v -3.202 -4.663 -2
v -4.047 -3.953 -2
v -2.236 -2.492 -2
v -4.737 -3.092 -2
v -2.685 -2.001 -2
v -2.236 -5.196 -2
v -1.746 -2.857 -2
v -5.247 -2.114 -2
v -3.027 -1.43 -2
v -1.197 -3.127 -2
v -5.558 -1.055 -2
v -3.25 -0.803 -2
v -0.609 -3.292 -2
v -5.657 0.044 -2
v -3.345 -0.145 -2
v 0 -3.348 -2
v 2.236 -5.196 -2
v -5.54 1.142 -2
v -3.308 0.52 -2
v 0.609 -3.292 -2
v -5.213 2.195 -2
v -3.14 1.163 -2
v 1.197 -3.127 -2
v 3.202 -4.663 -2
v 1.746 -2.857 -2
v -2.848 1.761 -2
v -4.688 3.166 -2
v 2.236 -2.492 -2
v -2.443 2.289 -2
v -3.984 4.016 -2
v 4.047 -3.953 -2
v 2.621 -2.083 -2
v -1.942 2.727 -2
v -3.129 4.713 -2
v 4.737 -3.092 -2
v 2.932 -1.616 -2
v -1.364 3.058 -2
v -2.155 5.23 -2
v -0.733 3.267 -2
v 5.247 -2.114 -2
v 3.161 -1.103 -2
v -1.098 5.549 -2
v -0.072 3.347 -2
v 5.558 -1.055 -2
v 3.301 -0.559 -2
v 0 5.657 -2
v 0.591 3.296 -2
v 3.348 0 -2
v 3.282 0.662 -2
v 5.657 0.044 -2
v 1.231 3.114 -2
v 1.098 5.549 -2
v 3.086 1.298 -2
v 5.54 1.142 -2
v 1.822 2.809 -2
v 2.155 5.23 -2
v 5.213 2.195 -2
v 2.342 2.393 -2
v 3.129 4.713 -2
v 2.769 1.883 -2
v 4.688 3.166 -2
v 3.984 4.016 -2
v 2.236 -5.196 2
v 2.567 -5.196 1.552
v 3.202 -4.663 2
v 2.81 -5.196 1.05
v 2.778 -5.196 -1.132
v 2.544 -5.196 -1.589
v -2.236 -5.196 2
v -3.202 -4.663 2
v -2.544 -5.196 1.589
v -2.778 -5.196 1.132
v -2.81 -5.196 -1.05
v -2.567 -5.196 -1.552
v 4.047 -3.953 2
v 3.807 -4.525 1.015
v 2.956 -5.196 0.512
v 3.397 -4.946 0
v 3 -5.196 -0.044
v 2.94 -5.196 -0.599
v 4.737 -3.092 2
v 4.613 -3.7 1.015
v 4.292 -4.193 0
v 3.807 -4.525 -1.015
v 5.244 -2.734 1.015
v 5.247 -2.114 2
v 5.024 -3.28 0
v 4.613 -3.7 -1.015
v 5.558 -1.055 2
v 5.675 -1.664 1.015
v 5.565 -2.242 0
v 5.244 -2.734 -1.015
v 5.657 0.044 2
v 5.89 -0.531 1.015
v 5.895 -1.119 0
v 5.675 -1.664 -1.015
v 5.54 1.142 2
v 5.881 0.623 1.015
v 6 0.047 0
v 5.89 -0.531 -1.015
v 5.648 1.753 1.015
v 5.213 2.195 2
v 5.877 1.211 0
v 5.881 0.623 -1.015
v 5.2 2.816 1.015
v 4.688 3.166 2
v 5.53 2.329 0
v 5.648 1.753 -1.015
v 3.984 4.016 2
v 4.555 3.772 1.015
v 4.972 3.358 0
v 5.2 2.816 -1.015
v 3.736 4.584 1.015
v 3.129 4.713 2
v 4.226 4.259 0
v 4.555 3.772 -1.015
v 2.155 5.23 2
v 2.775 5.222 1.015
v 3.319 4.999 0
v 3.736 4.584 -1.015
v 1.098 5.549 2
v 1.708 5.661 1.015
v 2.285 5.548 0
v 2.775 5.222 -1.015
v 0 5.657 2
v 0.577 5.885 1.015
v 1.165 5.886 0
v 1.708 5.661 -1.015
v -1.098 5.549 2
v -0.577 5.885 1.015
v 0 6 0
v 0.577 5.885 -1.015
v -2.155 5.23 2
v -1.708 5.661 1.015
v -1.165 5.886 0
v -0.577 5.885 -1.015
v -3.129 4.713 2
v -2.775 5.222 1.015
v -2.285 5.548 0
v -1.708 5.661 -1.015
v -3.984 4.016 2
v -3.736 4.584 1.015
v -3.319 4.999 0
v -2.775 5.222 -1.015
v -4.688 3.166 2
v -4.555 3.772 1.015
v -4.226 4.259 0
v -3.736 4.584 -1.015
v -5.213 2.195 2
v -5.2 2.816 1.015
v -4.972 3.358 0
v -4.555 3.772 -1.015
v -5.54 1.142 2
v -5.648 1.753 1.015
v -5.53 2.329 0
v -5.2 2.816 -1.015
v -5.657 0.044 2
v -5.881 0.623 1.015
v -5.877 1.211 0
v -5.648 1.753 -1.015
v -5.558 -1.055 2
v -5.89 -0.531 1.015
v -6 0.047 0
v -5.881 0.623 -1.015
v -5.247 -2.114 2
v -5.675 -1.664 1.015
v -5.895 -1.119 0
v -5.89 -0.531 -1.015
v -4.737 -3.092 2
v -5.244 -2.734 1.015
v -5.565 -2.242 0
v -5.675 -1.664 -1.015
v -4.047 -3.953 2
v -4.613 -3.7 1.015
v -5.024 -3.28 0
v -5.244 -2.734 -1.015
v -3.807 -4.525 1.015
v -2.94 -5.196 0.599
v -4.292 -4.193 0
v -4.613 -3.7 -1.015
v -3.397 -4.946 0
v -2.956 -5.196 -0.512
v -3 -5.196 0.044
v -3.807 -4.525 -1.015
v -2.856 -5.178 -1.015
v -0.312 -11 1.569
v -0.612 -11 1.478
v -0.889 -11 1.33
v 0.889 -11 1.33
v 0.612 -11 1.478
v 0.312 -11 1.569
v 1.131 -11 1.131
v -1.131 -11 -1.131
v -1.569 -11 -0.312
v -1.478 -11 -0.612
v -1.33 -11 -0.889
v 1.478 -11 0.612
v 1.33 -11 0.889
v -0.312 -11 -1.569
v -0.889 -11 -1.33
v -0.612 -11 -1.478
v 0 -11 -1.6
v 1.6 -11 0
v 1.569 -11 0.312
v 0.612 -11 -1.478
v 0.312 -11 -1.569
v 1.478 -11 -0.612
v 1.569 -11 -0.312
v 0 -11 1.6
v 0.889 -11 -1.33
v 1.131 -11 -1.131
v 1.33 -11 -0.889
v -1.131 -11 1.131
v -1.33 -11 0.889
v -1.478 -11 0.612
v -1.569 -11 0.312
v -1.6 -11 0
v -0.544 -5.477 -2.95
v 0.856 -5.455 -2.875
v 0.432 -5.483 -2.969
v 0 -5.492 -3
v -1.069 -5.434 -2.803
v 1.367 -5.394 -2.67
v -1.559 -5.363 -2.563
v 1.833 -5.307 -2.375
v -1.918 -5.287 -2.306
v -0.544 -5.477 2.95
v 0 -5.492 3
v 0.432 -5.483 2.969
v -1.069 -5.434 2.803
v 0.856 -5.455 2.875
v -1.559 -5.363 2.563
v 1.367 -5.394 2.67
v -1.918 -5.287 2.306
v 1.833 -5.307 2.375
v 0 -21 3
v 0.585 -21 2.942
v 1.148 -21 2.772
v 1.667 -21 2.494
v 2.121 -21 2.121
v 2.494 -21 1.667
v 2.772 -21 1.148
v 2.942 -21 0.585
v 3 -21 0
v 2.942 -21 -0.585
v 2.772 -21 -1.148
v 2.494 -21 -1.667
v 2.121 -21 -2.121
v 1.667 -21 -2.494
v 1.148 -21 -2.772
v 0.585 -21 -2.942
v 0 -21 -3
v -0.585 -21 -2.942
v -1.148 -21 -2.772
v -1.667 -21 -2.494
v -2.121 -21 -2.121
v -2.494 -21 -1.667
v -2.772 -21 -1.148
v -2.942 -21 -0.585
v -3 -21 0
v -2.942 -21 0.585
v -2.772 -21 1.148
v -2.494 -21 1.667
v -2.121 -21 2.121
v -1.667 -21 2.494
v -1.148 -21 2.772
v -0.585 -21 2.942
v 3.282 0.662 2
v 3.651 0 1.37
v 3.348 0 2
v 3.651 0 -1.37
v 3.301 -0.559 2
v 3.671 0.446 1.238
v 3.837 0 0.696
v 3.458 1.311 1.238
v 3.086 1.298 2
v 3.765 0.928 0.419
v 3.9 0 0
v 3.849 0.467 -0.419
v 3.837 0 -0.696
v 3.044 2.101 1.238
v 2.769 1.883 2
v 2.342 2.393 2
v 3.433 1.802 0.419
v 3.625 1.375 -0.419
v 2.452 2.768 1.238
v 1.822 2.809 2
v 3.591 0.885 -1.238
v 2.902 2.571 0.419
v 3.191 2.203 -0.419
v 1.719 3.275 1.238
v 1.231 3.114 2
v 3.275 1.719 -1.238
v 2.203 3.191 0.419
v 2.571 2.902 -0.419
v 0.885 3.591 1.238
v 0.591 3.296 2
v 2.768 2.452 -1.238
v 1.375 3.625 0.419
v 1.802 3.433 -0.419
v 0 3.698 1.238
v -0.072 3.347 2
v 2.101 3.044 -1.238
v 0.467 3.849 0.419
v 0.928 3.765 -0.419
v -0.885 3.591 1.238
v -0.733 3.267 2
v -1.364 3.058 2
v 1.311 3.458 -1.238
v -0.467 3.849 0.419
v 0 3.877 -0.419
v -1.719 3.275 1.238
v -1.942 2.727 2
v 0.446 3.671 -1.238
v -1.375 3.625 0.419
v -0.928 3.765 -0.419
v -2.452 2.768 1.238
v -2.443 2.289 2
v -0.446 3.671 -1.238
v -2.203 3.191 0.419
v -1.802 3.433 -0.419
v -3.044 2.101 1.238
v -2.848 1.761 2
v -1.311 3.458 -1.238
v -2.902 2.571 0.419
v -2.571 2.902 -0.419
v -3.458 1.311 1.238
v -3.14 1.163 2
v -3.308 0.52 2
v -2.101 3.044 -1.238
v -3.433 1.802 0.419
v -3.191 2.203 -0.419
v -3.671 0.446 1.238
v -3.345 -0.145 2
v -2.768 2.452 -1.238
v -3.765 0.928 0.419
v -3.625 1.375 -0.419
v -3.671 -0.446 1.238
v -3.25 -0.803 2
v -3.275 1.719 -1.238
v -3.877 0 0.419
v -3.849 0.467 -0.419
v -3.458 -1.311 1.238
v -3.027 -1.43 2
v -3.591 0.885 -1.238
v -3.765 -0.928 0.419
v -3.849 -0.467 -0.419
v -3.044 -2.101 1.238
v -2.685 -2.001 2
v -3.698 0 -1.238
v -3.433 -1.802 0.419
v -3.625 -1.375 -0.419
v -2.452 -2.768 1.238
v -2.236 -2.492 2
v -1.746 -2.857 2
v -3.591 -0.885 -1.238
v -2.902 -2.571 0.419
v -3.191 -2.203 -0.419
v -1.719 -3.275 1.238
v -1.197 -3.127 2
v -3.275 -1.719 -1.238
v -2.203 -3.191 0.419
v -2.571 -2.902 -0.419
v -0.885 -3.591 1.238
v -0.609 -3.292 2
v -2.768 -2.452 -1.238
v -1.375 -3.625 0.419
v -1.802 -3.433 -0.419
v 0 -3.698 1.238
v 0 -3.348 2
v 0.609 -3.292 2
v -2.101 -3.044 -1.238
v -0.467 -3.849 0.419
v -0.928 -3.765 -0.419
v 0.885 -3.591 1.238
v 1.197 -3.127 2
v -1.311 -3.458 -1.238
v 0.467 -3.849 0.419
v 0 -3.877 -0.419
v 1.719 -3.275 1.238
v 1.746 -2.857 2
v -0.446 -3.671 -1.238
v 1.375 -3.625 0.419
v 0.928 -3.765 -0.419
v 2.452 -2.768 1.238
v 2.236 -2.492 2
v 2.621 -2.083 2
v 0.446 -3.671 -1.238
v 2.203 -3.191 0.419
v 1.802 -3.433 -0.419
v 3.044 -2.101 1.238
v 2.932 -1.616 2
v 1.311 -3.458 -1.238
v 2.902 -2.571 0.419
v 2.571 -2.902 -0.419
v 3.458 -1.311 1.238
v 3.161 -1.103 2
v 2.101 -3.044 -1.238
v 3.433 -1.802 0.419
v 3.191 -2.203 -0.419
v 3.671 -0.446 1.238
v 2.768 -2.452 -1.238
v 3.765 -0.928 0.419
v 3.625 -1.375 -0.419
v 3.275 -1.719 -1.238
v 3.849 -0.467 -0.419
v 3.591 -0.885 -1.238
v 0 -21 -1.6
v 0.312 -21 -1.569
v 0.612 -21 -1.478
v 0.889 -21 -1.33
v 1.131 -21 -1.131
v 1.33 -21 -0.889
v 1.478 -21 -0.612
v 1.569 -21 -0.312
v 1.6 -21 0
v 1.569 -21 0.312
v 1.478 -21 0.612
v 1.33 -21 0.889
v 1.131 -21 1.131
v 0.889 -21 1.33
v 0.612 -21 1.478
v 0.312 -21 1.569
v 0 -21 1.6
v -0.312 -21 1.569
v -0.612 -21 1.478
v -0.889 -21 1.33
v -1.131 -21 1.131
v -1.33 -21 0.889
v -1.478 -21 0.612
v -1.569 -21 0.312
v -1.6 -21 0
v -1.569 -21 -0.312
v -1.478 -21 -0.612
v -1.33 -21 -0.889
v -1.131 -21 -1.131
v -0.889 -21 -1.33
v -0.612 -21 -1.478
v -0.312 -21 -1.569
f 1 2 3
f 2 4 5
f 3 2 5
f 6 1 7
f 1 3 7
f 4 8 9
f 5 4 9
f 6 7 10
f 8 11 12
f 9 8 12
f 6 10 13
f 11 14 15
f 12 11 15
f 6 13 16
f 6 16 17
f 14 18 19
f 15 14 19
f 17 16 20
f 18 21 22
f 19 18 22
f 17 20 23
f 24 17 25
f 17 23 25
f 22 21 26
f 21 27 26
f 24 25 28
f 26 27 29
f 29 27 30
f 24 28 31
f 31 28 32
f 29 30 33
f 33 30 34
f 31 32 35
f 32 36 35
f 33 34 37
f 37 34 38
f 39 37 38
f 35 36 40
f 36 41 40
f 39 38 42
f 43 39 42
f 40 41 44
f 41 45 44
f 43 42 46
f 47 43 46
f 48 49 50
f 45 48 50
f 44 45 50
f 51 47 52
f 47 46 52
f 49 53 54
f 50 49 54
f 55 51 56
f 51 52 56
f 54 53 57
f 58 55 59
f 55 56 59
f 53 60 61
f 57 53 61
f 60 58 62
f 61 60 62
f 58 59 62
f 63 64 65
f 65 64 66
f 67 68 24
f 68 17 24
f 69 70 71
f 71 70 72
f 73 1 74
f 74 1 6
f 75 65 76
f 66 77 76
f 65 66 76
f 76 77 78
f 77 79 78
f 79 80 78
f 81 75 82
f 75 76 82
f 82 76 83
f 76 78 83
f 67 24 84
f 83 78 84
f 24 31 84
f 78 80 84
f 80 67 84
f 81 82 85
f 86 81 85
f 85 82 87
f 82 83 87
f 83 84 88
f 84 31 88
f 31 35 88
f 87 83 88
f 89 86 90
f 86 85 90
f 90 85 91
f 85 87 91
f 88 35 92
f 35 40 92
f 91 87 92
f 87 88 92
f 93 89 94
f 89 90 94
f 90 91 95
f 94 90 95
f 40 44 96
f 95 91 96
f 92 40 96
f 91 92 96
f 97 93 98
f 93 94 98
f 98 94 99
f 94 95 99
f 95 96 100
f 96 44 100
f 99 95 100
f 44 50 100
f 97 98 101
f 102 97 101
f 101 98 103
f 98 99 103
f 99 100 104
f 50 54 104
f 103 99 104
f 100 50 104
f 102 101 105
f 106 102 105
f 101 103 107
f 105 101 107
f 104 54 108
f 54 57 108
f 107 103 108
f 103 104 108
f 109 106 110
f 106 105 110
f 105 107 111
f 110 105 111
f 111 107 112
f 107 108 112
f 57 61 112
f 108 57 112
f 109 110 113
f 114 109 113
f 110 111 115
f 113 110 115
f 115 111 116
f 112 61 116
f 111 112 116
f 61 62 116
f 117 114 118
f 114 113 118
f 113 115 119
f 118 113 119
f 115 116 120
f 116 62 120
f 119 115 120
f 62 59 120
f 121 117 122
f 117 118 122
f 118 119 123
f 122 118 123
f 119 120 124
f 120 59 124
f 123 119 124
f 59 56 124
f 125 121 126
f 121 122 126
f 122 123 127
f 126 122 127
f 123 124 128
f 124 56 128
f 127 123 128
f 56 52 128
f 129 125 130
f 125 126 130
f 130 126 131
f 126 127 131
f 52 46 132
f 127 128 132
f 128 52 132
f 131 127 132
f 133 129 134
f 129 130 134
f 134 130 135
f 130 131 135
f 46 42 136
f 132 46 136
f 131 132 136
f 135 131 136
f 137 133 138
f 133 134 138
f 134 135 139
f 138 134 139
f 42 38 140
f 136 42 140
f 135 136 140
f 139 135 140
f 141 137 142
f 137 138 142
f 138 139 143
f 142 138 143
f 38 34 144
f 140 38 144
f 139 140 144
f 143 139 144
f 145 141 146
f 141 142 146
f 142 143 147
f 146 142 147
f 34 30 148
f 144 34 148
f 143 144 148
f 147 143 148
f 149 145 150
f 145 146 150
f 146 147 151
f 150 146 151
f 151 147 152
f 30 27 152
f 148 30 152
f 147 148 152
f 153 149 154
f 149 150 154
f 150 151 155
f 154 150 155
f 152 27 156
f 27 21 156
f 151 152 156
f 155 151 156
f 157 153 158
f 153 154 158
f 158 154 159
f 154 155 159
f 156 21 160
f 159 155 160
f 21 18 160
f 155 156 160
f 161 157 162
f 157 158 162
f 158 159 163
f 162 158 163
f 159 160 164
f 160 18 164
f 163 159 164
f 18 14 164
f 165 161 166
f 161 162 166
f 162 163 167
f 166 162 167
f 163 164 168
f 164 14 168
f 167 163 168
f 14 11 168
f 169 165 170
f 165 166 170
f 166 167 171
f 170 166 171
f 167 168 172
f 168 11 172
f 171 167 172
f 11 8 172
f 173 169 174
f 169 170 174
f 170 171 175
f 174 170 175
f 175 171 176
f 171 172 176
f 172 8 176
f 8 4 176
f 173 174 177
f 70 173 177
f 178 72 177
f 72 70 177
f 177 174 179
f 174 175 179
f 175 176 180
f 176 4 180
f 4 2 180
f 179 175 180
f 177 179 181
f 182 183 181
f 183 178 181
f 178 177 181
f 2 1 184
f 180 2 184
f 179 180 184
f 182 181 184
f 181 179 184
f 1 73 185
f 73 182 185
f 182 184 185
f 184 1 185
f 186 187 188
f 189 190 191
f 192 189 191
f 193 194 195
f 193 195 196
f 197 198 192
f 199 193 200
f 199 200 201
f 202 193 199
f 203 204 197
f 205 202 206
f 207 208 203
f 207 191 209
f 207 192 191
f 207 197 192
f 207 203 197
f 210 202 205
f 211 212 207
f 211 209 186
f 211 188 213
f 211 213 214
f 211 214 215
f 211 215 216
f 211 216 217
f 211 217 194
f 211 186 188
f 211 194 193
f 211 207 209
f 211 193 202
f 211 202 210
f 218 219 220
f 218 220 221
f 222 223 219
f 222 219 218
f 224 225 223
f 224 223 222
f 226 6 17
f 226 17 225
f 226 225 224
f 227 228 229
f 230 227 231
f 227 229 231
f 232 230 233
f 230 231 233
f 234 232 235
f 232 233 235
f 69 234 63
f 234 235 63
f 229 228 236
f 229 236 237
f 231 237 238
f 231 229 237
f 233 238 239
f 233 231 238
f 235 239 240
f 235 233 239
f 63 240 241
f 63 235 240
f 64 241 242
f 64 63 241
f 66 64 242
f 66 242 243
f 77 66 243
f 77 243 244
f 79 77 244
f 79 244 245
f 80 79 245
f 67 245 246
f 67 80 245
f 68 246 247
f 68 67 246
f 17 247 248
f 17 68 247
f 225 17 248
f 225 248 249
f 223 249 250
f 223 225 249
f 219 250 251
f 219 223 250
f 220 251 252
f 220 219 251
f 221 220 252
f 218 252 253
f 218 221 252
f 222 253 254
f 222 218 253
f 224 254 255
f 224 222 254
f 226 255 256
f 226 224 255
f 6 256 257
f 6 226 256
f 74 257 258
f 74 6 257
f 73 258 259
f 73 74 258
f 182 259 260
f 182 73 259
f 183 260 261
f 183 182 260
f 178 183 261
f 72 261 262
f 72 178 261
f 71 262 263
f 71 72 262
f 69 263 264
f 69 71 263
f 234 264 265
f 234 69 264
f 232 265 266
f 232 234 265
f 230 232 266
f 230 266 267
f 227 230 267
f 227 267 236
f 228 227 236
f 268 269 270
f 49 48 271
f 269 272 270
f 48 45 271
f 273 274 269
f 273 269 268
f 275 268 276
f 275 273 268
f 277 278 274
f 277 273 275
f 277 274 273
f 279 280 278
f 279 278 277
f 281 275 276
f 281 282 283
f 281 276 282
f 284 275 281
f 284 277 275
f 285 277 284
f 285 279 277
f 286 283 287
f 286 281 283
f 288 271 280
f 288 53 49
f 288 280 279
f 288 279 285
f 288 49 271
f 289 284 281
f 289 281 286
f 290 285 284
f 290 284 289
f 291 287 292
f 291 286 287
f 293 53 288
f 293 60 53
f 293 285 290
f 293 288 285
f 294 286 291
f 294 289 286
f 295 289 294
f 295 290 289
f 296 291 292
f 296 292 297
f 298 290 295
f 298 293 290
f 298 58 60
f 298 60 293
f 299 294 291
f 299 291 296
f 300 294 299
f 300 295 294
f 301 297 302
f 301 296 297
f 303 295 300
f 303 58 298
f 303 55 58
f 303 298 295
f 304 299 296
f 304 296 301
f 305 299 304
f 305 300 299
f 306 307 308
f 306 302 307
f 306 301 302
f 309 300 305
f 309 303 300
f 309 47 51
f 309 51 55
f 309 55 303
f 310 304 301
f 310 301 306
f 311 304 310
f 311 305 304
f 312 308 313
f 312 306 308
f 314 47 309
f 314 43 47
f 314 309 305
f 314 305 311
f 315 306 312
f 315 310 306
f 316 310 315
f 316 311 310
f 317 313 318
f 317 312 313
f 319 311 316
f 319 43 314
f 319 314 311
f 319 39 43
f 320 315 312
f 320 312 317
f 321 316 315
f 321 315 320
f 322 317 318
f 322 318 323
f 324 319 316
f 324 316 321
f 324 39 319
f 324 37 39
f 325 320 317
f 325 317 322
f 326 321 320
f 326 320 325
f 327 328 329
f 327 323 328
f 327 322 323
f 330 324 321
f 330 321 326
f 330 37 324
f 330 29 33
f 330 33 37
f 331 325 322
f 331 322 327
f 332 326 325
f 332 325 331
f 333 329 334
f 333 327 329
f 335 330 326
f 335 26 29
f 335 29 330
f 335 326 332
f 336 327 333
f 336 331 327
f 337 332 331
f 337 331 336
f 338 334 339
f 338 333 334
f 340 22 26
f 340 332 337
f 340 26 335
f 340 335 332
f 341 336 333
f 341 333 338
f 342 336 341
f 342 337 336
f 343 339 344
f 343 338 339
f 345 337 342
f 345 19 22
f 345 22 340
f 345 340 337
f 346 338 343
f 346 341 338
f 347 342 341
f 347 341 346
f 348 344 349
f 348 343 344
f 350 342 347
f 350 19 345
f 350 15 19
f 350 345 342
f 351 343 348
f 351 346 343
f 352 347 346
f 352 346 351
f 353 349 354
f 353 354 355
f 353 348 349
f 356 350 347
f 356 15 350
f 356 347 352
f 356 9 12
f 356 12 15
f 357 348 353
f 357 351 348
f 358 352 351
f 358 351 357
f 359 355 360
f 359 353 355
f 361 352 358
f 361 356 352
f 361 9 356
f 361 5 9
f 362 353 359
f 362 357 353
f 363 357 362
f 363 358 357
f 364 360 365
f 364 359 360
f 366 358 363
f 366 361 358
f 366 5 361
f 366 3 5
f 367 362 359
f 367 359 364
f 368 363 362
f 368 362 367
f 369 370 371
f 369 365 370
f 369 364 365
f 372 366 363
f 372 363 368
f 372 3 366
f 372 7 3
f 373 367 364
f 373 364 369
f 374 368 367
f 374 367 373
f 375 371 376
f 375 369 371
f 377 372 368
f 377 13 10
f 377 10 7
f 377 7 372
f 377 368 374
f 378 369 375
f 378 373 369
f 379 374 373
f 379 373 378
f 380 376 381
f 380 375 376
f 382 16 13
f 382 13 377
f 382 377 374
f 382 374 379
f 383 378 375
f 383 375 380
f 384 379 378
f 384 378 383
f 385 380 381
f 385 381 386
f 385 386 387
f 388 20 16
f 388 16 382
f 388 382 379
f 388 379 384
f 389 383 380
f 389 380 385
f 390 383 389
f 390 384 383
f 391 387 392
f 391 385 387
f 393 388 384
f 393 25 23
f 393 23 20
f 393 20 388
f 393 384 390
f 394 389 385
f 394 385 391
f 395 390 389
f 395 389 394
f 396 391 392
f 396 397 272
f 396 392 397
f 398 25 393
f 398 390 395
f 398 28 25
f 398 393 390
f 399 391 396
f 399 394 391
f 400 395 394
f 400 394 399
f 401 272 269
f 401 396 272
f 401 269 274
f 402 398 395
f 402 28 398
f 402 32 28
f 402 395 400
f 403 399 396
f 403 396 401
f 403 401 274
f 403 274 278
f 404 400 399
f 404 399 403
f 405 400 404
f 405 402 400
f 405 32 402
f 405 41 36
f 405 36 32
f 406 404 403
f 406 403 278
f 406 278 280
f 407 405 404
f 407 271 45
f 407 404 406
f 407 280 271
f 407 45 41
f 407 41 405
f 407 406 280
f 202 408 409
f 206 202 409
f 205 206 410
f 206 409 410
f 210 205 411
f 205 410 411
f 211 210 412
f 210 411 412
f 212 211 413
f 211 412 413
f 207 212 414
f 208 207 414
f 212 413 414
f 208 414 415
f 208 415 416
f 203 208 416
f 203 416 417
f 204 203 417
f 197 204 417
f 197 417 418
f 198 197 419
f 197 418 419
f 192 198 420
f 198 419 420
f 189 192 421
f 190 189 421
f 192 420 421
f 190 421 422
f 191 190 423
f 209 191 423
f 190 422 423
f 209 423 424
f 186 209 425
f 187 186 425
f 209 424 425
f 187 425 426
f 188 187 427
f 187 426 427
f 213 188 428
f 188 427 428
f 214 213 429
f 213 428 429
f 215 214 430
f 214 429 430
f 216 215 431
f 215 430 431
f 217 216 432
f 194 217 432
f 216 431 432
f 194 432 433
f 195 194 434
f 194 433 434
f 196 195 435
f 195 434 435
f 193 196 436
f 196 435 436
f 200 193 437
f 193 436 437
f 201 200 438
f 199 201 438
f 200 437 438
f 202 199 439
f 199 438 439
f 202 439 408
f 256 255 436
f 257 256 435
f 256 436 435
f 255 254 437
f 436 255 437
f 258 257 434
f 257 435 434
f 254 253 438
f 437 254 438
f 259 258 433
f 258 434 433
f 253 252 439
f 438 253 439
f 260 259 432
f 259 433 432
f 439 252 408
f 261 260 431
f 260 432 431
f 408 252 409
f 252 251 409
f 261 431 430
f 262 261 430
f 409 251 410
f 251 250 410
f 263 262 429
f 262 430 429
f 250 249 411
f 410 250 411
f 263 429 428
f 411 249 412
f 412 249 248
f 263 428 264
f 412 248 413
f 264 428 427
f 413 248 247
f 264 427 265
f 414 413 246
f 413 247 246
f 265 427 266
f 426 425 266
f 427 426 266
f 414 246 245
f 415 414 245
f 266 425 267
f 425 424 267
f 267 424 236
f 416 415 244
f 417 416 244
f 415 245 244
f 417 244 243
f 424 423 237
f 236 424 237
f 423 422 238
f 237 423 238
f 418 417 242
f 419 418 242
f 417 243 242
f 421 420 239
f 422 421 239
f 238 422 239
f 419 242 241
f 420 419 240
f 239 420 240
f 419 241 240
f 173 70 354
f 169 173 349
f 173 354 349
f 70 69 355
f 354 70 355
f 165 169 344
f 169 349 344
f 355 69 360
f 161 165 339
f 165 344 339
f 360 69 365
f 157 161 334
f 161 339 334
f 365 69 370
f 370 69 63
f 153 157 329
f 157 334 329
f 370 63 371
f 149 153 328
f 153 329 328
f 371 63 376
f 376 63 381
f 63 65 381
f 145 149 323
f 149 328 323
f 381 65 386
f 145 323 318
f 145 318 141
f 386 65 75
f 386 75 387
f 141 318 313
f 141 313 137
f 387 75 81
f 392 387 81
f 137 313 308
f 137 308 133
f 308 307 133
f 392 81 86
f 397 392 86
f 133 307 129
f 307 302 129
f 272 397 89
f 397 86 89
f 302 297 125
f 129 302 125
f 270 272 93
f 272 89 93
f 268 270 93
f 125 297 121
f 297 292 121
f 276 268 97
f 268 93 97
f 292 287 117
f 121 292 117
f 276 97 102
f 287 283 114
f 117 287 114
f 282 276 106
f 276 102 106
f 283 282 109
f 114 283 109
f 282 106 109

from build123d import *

# Parameters (mm, degrees)
SKETCH3_R           = 3
BOSS_EXTRUDE1_DEPTH = 21
CUT_EXTRUDE1_DEPTH  = 5
SKETCH6_R           = 1.6
CUT_EXTRUDE2_DEPTH  = 10


with BuildPart() as part:
    # Sketch1 → Revolve1 (revolve)
    with BuildSketch(Plane(origin=(0, 0, 0), x_dir=(1, 0, 0), z_dir=(0, 1, 0))):
        with BuildLine():
            Line((0, 2), (0, -2))
            Line((0, -2), (5.656854249, -2))
            ThreePointArc((5.656854249, -2), (6, 0), (5.656854249, 2))
            Line((5.656854249, 2), (0, 2))
        make_face()
    revolve(axis=Axis((0, 0, -2), (0, 0, 1)))

    # Sketch3 → Boss-Extrude1 (add)
    with BuildSketch(Plane(origin=(0, 0, 0), x_dir=(1, 0, 0), z_dir=(0, 1, 0))):
        with Locations(Location((0, 0, 0), (0, 0, 270))):
            Circle(SKETCH3_R)
    extrude(amount=-BOSS_EXTRUDE1_DEPTH)

    # Sketch4 → Cut-Revolve2 (revolve, cut)
    with BuildSketch(Plane(origin=(0, 0, 0), x_dir=(1, 0, 0), z_dir=(0, 1, 0))):
        with BuildLine():
            Line((0, 3.9), (0, -3.9))
            ThreePointArc((0, -3.9), (3.9, 0), (0, 3.9))
        make_face()
    revolve(axis=Axis((0, 0, -3.9), (0, 0, 1)), mode=Mode.SUBTRACT)

    # Sketch5 → Cut-Extrude1 (cut, symmetric)
    with BuildSketch(Plane(origin=(0, 0, 0), x_dir=(0, 0, -1), z_dir=(1, 0, 0))):
        Polygon((2, -5.196152423), (3, -5.491987159), (3, -2.491987159), (2, -2.491987159), align=None)
        Polygon((-2, -2.491987159), (-3, -2.491987159), (-3, -5.491987159), (-2, -5.196152423), align=None)
    extrude(amount=CUT_EXTRUDE1_DEPTH, both=True, mode=Mode.SUBTRACT)

    # Sketch6 → Cut-Extrude2 (cut)
    with BuildSketch(Plane.XZ.offset(21)):
        with Locations(Location((0, 0, 0), (0, 0, 270))):
            Circle(SKETCH6_R)
    extrude(amount=-CUT_EXTRUDE2_DEPTH, mode=Mode.SUBTRACT)


solid = part.part
